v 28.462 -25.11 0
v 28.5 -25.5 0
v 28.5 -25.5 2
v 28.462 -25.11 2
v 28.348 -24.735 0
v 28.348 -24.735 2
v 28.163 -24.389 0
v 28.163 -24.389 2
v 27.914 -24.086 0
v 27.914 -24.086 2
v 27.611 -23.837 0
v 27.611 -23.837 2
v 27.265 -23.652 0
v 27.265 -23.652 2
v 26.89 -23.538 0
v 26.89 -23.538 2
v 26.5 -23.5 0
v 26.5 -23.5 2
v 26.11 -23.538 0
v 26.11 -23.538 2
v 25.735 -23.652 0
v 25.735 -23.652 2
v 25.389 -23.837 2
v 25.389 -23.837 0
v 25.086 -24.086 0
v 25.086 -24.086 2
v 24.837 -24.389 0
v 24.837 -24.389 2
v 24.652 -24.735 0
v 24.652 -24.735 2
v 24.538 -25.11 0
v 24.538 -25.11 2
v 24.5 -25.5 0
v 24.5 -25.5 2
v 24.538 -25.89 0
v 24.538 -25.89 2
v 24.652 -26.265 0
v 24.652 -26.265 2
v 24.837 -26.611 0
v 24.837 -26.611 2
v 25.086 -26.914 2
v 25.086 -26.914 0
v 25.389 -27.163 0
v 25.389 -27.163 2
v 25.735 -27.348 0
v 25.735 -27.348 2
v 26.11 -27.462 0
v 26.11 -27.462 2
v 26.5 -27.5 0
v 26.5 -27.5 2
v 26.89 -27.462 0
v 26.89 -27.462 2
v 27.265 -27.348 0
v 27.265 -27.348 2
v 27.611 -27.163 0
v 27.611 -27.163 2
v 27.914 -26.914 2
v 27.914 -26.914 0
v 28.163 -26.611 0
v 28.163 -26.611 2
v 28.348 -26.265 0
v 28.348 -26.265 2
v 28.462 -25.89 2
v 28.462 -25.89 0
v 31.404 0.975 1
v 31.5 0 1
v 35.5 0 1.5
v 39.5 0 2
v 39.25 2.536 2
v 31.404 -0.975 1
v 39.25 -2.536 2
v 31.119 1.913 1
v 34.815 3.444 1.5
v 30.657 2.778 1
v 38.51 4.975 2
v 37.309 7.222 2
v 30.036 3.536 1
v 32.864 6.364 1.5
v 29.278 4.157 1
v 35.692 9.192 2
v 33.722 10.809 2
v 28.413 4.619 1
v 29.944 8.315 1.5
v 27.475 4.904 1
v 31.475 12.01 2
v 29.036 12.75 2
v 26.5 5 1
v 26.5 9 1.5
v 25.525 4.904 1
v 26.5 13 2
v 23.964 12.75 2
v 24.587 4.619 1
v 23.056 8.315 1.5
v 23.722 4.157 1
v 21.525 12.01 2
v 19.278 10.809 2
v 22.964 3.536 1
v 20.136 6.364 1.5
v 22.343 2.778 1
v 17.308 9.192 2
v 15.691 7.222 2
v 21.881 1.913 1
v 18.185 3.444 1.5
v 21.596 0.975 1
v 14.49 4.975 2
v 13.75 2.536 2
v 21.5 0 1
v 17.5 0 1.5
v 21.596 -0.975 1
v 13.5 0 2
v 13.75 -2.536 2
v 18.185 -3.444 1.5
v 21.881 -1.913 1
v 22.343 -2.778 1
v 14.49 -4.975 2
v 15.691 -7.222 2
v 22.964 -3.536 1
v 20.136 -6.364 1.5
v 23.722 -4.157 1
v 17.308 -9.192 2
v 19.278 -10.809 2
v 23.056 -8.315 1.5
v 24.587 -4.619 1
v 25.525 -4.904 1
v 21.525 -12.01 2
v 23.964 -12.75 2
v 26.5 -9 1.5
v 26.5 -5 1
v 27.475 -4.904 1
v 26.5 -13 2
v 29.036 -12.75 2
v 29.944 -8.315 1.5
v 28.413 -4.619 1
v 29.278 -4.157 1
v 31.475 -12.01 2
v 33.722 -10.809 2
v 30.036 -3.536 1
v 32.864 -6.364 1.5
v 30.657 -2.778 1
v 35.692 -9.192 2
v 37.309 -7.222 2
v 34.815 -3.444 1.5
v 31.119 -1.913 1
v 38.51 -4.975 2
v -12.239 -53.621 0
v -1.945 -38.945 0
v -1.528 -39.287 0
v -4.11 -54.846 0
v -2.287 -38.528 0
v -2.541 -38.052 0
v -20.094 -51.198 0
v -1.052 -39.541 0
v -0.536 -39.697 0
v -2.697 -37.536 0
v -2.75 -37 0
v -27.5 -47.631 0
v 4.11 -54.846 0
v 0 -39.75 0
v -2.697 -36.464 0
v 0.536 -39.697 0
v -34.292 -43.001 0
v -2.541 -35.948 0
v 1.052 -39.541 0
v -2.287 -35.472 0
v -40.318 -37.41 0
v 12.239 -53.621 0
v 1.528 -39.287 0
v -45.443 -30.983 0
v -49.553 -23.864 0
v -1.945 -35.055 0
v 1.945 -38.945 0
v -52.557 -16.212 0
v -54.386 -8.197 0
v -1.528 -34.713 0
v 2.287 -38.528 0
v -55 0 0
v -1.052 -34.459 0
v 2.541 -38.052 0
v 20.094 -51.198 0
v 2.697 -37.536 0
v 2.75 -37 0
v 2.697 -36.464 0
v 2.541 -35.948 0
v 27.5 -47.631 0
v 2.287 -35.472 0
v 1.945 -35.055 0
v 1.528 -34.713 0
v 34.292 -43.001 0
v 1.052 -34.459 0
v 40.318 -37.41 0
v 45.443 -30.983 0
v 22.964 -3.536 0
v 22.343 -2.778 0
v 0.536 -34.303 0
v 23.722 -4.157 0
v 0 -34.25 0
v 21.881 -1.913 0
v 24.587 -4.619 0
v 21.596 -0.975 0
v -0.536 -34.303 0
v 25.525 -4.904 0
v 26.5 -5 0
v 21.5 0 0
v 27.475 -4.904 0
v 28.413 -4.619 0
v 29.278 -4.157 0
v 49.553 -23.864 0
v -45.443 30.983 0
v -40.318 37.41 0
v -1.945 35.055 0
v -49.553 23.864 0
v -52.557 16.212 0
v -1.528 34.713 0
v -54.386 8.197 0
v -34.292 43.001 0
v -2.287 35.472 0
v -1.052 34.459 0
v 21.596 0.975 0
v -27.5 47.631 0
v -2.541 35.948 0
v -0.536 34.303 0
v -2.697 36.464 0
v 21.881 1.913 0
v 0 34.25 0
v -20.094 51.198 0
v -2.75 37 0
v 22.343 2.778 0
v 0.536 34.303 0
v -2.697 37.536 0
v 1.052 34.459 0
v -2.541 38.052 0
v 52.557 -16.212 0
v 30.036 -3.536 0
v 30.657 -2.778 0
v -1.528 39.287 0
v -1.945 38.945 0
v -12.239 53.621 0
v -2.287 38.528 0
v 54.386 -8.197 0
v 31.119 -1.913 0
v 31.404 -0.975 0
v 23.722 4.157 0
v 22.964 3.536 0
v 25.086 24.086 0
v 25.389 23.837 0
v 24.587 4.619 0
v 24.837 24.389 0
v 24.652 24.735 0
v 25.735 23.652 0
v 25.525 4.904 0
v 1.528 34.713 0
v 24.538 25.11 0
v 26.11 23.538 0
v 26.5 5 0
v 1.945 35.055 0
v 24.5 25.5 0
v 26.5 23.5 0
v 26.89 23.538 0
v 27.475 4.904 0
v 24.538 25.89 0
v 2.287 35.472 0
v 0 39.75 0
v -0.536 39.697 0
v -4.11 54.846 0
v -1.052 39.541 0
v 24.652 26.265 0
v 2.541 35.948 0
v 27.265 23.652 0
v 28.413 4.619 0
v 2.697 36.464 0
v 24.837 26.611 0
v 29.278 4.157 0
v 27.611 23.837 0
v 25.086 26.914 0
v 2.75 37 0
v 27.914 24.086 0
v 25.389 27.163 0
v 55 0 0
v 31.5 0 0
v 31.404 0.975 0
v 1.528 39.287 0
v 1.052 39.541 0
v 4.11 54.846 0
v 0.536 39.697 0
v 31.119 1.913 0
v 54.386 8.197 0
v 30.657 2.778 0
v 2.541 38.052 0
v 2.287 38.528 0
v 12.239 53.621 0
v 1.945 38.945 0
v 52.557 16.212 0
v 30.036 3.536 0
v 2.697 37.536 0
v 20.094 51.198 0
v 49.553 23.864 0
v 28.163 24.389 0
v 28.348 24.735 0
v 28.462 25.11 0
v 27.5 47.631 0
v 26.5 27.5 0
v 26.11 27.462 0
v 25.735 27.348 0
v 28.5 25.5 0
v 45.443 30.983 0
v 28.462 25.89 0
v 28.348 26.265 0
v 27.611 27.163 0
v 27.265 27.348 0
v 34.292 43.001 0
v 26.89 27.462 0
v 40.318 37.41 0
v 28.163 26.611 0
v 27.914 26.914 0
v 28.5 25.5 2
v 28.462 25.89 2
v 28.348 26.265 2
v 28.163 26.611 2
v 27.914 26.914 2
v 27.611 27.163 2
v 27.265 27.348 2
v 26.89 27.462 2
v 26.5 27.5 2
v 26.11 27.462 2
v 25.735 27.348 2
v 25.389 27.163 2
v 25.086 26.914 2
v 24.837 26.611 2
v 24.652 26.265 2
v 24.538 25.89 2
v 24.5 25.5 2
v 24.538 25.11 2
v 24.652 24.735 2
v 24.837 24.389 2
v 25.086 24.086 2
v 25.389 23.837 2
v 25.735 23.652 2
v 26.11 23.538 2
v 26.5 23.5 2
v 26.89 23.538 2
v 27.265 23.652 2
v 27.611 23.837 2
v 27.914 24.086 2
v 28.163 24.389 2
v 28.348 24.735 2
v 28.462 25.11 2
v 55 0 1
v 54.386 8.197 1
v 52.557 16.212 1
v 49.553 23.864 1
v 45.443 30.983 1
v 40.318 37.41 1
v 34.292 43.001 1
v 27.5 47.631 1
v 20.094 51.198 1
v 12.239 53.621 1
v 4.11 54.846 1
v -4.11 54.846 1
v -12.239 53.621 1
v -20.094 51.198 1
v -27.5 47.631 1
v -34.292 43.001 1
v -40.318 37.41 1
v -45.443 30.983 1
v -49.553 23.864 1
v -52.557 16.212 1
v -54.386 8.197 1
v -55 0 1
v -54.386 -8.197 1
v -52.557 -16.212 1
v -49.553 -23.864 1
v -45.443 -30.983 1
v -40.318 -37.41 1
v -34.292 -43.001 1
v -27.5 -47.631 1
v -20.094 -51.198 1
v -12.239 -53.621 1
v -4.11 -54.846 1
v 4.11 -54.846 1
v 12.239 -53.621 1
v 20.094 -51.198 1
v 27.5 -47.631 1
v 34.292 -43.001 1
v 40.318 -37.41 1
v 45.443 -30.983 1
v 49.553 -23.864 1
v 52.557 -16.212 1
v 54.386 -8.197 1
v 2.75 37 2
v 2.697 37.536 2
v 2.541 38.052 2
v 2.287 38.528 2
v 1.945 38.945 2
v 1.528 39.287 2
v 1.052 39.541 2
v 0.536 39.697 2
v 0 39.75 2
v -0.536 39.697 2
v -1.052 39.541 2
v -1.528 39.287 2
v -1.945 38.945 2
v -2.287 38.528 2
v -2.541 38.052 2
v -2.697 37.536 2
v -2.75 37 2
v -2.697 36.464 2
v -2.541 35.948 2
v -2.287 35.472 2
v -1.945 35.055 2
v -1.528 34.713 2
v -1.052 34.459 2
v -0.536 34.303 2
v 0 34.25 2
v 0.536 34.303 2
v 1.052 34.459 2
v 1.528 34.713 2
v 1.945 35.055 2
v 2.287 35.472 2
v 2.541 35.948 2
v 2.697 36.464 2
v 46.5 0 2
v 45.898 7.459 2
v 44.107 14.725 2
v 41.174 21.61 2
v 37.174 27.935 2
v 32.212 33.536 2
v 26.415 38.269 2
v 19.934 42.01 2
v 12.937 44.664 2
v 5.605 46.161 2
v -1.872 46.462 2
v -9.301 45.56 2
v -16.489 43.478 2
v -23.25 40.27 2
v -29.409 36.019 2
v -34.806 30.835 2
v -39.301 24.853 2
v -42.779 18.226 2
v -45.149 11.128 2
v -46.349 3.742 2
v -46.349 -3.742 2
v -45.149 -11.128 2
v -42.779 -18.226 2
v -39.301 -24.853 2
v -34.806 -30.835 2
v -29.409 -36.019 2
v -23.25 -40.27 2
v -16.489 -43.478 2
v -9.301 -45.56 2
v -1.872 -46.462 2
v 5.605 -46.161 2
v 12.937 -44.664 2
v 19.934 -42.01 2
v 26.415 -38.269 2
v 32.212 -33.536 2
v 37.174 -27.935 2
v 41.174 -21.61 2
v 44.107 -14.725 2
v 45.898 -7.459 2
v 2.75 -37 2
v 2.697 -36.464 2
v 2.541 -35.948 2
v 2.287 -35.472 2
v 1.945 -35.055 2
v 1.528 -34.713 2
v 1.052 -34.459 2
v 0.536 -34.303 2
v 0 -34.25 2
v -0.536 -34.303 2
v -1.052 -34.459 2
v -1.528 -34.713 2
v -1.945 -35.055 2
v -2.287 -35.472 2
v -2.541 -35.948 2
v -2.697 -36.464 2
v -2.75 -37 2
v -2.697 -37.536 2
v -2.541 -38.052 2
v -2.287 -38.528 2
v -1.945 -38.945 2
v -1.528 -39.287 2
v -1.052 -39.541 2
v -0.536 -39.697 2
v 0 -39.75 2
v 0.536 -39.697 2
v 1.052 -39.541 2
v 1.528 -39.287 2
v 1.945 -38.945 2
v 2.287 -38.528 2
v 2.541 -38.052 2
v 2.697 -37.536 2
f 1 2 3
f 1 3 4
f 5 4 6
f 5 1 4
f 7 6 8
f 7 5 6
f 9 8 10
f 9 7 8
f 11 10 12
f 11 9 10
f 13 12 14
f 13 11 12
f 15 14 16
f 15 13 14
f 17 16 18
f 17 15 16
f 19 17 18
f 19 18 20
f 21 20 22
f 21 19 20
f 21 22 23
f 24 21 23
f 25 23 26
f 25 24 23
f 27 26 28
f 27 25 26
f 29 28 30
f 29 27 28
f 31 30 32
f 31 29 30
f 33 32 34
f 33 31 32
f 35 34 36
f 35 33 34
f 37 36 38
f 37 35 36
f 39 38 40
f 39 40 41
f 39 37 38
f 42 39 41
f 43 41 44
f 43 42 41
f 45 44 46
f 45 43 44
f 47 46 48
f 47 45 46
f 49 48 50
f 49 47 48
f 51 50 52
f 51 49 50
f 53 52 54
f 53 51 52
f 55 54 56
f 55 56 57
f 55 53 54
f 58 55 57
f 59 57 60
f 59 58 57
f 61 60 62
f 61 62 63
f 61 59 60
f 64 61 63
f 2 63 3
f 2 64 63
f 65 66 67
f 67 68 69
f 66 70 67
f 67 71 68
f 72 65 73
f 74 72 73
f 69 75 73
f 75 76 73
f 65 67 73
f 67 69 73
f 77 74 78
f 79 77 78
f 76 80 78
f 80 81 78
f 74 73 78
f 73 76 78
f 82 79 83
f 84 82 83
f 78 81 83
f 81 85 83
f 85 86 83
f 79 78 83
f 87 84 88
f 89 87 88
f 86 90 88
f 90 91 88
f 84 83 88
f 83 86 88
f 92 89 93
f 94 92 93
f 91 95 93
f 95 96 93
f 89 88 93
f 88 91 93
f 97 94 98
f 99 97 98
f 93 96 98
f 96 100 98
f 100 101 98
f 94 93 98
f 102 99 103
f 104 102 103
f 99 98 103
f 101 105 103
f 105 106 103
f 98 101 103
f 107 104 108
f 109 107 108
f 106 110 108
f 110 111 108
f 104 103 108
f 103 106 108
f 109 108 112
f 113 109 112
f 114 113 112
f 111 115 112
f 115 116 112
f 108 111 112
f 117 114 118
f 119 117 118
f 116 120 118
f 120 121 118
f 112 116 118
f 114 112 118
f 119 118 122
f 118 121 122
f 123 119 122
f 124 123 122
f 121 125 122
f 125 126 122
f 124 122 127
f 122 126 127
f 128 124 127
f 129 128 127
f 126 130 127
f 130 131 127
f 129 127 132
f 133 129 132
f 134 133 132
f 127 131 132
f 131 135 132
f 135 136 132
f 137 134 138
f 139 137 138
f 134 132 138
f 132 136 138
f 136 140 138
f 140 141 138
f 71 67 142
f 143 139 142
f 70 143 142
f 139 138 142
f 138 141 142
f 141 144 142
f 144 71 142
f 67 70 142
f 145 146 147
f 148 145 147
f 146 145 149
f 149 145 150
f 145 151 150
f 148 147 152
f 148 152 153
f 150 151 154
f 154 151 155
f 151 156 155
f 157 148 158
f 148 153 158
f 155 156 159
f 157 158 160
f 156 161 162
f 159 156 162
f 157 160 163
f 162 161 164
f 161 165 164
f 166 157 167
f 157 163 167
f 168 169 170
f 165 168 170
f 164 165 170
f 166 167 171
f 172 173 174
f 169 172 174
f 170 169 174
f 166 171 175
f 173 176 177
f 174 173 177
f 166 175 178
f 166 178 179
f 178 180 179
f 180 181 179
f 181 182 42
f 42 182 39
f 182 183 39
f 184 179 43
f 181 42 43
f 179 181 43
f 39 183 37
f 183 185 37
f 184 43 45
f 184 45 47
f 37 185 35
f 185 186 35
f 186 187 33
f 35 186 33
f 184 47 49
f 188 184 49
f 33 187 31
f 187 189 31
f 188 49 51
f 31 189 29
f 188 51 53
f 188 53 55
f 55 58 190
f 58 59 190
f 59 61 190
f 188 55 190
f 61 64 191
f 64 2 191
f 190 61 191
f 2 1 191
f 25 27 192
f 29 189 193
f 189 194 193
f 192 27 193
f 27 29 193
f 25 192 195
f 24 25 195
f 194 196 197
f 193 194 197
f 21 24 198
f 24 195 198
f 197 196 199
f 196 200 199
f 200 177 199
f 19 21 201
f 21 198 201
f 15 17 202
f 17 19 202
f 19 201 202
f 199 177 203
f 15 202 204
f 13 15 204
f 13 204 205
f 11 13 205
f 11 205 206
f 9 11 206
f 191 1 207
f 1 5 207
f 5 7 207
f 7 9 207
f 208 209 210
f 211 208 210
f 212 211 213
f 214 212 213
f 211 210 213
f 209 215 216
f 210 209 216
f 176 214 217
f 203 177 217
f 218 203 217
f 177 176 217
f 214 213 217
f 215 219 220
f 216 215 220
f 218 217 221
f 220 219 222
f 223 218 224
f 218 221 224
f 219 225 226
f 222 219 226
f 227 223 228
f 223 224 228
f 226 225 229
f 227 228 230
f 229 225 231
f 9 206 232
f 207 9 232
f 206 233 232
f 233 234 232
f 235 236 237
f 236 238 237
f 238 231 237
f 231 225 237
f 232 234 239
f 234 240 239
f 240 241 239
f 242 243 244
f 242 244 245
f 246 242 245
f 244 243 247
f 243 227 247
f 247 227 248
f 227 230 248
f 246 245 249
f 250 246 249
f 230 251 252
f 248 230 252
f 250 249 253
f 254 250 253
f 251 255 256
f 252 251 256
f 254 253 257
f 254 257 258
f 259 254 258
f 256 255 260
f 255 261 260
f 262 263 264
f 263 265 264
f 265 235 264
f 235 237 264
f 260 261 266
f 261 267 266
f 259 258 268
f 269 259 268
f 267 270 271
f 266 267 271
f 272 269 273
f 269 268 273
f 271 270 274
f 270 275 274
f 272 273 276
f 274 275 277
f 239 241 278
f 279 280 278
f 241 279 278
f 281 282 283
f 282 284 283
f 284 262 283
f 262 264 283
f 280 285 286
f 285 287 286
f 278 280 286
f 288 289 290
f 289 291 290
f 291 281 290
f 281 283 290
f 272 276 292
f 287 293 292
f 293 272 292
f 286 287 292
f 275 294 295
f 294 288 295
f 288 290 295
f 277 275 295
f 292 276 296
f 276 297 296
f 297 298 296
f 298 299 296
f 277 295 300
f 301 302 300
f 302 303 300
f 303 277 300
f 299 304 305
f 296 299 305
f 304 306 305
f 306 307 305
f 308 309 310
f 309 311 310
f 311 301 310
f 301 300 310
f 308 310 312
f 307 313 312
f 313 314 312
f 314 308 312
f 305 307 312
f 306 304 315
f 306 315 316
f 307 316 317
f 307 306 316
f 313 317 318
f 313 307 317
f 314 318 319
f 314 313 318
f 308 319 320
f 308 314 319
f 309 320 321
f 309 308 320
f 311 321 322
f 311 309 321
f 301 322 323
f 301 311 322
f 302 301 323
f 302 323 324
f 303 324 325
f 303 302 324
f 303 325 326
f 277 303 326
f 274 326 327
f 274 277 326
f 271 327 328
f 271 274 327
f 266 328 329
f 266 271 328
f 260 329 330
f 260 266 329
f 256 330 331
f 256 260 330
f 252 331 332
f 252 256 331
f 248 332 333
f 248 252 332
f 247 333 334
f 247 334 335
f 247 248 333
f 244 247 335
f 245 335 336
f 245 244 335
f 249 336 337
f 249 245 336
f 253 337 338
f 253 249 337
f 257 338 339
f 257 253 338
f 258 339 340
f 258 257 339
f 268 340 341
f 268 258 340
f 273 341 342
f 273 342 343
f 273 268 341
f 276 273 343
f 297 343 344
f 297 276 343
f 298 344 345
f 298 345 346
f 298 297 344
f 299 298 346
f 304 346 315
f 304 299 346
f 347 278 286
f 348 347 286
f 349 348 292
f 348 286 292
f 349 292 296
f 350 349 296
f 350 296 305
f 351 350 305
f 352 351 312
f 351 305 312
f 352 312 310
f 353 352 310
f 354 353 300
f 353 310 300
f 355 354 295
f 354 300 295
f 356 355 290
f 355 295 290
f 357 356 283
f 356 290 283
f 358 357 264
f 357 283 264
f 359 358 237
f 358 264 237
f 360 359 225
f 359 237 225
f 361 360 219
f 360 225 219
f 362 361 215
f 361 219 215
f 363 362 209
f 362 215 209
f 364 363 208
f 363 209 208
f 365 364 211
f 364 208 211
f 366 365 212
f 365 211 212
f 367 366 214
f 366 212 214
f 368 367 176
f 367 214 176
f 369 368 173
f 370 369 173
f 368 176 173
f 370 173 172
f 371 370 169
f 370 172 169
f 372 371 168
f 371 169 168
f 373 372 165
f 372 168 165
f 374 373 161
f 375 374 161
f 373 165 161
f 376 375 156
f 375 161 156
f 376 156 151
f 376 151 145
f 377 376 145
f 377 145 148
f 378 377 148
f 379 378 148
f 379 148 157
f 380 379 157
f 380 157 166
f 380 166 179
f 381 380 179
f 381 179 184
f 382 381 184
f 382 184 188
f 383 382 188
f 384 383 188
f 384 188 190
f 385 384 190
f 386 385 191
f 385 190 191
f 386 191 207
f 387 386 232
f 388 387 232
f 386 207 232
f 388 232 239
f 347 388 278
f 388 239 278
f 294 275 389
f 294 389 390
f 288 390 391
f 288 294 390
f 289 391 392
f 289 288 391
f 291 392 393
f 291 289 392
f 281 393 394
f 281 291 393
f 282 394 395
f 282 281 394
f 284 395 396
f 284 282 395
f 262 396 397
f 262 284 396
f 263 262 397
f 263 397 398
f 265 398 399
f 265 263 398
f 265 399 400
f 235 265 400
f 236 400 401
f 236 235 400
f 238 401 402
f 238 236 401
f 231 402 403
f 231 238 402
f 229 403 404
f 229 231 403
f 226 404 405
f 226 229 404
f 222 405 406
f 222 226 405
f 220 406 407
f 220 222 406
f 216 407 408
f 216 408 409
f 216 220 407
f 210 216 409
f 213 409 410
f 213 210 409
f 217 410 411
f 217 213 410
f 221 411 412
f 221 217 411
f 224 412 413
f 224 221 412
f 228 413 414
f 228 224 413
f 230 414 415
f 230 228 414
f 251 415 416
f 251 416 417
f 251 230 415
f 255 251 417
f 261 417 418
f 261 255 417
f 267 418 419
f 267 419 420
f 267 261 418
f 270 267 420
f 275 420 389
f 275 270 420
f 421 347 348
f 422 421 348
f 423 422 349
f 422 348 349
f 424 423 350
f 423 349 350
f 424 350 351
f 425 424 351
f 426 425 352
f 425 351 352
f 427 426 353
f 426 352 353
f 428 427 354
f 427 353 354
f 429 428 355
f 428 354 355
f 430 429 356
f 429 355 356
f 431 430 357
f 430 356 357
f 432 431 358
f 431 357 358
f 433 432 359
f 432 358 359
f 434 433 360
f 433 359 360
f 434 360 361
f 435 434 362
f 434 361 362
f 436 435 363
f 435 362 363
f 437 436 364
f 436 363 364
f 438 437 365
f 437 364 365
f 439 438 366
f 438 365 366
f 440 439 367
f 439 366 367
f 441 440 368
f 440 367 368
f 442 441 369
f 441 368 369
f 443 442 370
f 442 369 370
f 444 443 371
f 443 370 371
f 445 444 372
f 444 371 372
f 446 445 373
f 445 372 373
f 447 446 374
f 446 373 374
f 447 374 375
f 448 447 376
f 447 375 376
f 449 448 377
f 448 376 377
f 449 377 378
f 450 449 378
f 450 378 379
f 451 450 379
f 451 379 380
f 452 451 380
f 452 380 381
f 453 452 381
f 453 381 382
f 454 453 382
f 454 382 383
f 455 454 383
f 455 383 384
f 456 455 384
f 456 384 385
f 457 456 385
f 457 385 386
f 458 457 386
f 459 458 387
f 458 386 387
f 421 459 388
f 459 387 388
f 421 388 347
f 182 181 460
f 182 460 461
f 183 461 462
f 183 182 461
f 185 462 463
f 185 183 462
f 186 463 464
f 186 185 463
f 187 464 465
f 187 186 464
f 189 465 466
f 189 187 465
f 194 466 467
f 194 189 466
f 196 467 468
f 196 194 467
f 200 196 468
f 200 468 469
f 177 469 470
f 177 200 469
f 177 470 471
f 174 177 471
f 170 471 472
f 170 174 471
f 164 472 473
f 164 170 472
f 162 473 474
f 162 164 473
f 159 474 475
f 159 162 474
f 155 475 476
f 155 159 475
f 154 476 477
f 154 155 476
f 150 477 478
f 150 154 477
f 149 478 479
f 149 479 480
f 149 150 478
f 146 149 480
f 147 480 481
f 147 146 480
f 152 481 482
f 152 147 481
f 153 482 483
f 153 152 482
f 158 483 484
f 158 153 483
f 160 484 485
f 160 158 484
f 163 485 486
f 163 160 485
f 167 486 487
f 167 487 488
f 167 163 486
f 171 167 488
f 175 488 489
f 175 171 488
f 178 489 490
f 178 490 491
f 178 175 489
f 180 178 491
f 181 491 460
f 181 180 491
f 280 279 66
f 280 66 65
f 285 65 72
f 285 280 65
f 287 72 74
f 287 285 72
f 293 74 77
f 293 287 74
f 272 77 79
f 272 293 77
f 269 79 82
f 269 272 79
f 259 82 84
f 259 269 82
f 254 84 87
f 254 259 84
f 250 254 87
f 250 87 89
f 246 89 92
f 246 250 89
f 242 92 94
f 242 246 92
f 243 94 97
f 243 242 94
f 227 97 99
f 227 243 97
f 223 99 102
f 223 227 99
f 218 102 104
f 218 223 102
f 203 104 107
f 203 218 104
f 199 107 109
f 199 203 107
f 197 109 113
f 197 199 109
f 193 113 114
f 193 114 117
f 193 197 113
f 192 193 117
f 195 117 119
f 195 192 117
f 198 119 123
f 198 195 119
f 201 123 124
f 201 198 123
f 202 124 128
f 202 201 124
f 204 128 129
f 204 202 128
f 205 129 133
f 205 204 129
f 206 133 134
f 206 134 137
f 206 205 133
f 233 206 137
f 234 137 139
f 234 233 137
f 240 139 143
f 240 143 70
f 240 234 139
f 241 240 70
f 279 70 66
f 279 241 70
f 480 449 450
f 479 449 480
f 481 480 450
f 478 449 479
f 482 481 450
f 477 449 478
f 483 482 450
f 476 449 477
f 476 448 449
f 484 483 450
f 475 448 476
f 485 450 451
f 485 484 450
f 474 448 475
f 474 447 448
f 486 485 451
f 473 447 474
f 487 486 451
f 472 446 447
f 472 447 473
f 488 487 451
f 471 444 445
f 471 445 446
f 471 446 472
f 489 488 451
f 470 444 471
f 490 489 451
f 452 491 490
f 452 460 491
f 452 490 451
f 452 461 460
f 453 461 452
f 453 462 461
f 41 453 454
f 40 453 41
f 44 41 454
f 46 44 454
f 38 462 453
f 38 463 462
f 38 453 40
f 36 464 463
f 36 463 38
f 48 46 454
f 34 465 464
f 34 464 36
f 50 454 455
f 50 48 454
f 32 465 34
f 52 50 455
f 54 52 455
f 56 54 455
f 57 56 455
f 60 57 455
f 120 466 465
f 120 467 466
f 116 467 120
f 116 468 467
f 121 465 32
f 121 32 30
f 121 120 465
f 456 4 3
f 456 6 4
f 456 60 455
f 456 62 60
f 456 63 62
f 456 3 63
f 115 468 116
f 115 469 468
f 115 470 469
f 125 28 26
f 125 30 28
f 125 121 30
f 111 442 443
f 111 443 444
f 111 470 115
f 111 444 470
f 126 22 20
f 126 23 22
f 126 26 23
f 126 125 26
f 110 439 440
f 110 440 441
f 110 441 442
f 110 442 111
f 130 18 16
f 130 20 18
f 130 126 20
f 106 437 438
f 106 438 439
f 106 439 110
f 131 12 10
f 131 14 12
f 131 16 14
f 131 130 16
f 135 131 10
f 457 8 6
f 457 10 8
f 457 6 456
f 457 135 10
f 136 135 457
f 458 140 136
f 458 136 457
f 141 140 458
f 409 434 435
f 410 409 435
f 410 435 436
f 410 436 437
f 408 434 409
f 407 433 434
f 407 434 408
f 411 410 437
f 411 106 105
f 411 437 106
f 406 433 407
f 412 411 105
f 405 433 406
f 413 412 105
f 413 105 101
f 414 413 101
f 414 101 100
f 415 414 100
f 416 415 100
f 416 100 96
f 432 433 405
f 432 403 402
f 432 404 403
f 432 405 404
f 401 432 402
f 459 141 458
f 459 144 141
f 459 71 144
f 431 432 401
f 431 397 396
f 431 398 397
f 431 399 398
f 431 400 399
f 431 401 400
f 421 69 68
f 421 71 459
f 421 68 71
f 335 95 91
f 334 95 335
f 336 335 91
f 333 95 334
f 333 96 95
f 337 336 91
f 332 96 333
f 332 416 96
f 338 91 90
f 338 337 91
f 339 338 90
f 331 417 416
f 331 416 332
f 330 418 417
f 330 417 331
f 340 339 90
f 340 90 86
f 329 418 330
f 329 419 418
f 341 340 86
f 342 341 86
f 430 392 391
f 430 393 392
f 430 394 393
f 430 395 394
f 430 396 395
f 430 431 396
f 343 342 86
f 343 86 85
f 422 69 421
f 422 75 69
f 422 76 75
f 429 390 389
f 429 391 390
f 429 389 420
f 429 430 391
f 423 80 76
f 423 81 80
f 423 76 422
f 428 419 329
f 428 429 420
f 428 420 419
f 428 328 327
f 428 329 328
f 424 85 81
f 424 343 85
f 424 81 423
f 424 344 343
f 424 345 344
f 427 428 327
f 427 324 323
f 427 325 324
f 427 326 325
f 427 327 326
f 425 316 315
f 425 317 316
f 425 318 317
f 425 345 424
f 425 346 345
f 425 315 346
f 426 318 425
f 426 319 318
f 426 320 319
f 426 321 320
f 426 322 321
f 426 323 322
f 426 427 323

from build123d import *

# Parameters (mm, degrees)
F0_R     = 55
F0_R_2   = 2.75
F0_R_3   = 2
F0_R_4   = 5
F1_DEPTH = 2
F2_SIZE2 = 1
F2_SIZE  = 8.5
F3_SIZE2 = 8
F3_SIZE  = 1


with BuildPart() as f1:
    # F0 (on Top) → F1 (new body)
    with BuildSketch(Plane.XY):
        Circle(F0_R)
        with Locations((0, -37)):
            Circle(F0_R_2, mode=Mode.SUBTRACT)
        with Locations((26.5, -25.5)):
            Circle(F0_R_3, mode=Mode.SUBTRACT)
        with Locations((26.5, 0)):
            Circle(F0_R_4, mode=Mode.SUBTRACT)
        with Locations((26.5, 25.5)):
            Circle(F0_R_3, mode=Mode.SUBTRACT)
        with Locations((0, 37)):
            Circle(F0_R_2, mode=Mode.SUBTRACT)
    extrude(amount=F1_DEPTH)

    # F2
    f2_edges = [f1.edges().sort_by_distance(p)[0] for p in [
        (-55, 0, 2),
    ]]
    f2_side = f1.faces().sort_by_distance((-0.293764, 0, 2))[0]
    chamfer(f2_edges, length=F2_SIZE, length2=F2_SIZE2, reference=f2_side)

    # F3
    f3_edges = [f1.edges().sort_by_distance(p)[0] for p in [
        (21.5, 0, 2),
    ]]
    f3_side = f1.faces().sort_by_distance((21.5, 0, 1))[0]
    chamfer(f3_edges, length=F3_SIZE, length2=F3_SIZE2, reference=f3_side)


solid = f1.part
